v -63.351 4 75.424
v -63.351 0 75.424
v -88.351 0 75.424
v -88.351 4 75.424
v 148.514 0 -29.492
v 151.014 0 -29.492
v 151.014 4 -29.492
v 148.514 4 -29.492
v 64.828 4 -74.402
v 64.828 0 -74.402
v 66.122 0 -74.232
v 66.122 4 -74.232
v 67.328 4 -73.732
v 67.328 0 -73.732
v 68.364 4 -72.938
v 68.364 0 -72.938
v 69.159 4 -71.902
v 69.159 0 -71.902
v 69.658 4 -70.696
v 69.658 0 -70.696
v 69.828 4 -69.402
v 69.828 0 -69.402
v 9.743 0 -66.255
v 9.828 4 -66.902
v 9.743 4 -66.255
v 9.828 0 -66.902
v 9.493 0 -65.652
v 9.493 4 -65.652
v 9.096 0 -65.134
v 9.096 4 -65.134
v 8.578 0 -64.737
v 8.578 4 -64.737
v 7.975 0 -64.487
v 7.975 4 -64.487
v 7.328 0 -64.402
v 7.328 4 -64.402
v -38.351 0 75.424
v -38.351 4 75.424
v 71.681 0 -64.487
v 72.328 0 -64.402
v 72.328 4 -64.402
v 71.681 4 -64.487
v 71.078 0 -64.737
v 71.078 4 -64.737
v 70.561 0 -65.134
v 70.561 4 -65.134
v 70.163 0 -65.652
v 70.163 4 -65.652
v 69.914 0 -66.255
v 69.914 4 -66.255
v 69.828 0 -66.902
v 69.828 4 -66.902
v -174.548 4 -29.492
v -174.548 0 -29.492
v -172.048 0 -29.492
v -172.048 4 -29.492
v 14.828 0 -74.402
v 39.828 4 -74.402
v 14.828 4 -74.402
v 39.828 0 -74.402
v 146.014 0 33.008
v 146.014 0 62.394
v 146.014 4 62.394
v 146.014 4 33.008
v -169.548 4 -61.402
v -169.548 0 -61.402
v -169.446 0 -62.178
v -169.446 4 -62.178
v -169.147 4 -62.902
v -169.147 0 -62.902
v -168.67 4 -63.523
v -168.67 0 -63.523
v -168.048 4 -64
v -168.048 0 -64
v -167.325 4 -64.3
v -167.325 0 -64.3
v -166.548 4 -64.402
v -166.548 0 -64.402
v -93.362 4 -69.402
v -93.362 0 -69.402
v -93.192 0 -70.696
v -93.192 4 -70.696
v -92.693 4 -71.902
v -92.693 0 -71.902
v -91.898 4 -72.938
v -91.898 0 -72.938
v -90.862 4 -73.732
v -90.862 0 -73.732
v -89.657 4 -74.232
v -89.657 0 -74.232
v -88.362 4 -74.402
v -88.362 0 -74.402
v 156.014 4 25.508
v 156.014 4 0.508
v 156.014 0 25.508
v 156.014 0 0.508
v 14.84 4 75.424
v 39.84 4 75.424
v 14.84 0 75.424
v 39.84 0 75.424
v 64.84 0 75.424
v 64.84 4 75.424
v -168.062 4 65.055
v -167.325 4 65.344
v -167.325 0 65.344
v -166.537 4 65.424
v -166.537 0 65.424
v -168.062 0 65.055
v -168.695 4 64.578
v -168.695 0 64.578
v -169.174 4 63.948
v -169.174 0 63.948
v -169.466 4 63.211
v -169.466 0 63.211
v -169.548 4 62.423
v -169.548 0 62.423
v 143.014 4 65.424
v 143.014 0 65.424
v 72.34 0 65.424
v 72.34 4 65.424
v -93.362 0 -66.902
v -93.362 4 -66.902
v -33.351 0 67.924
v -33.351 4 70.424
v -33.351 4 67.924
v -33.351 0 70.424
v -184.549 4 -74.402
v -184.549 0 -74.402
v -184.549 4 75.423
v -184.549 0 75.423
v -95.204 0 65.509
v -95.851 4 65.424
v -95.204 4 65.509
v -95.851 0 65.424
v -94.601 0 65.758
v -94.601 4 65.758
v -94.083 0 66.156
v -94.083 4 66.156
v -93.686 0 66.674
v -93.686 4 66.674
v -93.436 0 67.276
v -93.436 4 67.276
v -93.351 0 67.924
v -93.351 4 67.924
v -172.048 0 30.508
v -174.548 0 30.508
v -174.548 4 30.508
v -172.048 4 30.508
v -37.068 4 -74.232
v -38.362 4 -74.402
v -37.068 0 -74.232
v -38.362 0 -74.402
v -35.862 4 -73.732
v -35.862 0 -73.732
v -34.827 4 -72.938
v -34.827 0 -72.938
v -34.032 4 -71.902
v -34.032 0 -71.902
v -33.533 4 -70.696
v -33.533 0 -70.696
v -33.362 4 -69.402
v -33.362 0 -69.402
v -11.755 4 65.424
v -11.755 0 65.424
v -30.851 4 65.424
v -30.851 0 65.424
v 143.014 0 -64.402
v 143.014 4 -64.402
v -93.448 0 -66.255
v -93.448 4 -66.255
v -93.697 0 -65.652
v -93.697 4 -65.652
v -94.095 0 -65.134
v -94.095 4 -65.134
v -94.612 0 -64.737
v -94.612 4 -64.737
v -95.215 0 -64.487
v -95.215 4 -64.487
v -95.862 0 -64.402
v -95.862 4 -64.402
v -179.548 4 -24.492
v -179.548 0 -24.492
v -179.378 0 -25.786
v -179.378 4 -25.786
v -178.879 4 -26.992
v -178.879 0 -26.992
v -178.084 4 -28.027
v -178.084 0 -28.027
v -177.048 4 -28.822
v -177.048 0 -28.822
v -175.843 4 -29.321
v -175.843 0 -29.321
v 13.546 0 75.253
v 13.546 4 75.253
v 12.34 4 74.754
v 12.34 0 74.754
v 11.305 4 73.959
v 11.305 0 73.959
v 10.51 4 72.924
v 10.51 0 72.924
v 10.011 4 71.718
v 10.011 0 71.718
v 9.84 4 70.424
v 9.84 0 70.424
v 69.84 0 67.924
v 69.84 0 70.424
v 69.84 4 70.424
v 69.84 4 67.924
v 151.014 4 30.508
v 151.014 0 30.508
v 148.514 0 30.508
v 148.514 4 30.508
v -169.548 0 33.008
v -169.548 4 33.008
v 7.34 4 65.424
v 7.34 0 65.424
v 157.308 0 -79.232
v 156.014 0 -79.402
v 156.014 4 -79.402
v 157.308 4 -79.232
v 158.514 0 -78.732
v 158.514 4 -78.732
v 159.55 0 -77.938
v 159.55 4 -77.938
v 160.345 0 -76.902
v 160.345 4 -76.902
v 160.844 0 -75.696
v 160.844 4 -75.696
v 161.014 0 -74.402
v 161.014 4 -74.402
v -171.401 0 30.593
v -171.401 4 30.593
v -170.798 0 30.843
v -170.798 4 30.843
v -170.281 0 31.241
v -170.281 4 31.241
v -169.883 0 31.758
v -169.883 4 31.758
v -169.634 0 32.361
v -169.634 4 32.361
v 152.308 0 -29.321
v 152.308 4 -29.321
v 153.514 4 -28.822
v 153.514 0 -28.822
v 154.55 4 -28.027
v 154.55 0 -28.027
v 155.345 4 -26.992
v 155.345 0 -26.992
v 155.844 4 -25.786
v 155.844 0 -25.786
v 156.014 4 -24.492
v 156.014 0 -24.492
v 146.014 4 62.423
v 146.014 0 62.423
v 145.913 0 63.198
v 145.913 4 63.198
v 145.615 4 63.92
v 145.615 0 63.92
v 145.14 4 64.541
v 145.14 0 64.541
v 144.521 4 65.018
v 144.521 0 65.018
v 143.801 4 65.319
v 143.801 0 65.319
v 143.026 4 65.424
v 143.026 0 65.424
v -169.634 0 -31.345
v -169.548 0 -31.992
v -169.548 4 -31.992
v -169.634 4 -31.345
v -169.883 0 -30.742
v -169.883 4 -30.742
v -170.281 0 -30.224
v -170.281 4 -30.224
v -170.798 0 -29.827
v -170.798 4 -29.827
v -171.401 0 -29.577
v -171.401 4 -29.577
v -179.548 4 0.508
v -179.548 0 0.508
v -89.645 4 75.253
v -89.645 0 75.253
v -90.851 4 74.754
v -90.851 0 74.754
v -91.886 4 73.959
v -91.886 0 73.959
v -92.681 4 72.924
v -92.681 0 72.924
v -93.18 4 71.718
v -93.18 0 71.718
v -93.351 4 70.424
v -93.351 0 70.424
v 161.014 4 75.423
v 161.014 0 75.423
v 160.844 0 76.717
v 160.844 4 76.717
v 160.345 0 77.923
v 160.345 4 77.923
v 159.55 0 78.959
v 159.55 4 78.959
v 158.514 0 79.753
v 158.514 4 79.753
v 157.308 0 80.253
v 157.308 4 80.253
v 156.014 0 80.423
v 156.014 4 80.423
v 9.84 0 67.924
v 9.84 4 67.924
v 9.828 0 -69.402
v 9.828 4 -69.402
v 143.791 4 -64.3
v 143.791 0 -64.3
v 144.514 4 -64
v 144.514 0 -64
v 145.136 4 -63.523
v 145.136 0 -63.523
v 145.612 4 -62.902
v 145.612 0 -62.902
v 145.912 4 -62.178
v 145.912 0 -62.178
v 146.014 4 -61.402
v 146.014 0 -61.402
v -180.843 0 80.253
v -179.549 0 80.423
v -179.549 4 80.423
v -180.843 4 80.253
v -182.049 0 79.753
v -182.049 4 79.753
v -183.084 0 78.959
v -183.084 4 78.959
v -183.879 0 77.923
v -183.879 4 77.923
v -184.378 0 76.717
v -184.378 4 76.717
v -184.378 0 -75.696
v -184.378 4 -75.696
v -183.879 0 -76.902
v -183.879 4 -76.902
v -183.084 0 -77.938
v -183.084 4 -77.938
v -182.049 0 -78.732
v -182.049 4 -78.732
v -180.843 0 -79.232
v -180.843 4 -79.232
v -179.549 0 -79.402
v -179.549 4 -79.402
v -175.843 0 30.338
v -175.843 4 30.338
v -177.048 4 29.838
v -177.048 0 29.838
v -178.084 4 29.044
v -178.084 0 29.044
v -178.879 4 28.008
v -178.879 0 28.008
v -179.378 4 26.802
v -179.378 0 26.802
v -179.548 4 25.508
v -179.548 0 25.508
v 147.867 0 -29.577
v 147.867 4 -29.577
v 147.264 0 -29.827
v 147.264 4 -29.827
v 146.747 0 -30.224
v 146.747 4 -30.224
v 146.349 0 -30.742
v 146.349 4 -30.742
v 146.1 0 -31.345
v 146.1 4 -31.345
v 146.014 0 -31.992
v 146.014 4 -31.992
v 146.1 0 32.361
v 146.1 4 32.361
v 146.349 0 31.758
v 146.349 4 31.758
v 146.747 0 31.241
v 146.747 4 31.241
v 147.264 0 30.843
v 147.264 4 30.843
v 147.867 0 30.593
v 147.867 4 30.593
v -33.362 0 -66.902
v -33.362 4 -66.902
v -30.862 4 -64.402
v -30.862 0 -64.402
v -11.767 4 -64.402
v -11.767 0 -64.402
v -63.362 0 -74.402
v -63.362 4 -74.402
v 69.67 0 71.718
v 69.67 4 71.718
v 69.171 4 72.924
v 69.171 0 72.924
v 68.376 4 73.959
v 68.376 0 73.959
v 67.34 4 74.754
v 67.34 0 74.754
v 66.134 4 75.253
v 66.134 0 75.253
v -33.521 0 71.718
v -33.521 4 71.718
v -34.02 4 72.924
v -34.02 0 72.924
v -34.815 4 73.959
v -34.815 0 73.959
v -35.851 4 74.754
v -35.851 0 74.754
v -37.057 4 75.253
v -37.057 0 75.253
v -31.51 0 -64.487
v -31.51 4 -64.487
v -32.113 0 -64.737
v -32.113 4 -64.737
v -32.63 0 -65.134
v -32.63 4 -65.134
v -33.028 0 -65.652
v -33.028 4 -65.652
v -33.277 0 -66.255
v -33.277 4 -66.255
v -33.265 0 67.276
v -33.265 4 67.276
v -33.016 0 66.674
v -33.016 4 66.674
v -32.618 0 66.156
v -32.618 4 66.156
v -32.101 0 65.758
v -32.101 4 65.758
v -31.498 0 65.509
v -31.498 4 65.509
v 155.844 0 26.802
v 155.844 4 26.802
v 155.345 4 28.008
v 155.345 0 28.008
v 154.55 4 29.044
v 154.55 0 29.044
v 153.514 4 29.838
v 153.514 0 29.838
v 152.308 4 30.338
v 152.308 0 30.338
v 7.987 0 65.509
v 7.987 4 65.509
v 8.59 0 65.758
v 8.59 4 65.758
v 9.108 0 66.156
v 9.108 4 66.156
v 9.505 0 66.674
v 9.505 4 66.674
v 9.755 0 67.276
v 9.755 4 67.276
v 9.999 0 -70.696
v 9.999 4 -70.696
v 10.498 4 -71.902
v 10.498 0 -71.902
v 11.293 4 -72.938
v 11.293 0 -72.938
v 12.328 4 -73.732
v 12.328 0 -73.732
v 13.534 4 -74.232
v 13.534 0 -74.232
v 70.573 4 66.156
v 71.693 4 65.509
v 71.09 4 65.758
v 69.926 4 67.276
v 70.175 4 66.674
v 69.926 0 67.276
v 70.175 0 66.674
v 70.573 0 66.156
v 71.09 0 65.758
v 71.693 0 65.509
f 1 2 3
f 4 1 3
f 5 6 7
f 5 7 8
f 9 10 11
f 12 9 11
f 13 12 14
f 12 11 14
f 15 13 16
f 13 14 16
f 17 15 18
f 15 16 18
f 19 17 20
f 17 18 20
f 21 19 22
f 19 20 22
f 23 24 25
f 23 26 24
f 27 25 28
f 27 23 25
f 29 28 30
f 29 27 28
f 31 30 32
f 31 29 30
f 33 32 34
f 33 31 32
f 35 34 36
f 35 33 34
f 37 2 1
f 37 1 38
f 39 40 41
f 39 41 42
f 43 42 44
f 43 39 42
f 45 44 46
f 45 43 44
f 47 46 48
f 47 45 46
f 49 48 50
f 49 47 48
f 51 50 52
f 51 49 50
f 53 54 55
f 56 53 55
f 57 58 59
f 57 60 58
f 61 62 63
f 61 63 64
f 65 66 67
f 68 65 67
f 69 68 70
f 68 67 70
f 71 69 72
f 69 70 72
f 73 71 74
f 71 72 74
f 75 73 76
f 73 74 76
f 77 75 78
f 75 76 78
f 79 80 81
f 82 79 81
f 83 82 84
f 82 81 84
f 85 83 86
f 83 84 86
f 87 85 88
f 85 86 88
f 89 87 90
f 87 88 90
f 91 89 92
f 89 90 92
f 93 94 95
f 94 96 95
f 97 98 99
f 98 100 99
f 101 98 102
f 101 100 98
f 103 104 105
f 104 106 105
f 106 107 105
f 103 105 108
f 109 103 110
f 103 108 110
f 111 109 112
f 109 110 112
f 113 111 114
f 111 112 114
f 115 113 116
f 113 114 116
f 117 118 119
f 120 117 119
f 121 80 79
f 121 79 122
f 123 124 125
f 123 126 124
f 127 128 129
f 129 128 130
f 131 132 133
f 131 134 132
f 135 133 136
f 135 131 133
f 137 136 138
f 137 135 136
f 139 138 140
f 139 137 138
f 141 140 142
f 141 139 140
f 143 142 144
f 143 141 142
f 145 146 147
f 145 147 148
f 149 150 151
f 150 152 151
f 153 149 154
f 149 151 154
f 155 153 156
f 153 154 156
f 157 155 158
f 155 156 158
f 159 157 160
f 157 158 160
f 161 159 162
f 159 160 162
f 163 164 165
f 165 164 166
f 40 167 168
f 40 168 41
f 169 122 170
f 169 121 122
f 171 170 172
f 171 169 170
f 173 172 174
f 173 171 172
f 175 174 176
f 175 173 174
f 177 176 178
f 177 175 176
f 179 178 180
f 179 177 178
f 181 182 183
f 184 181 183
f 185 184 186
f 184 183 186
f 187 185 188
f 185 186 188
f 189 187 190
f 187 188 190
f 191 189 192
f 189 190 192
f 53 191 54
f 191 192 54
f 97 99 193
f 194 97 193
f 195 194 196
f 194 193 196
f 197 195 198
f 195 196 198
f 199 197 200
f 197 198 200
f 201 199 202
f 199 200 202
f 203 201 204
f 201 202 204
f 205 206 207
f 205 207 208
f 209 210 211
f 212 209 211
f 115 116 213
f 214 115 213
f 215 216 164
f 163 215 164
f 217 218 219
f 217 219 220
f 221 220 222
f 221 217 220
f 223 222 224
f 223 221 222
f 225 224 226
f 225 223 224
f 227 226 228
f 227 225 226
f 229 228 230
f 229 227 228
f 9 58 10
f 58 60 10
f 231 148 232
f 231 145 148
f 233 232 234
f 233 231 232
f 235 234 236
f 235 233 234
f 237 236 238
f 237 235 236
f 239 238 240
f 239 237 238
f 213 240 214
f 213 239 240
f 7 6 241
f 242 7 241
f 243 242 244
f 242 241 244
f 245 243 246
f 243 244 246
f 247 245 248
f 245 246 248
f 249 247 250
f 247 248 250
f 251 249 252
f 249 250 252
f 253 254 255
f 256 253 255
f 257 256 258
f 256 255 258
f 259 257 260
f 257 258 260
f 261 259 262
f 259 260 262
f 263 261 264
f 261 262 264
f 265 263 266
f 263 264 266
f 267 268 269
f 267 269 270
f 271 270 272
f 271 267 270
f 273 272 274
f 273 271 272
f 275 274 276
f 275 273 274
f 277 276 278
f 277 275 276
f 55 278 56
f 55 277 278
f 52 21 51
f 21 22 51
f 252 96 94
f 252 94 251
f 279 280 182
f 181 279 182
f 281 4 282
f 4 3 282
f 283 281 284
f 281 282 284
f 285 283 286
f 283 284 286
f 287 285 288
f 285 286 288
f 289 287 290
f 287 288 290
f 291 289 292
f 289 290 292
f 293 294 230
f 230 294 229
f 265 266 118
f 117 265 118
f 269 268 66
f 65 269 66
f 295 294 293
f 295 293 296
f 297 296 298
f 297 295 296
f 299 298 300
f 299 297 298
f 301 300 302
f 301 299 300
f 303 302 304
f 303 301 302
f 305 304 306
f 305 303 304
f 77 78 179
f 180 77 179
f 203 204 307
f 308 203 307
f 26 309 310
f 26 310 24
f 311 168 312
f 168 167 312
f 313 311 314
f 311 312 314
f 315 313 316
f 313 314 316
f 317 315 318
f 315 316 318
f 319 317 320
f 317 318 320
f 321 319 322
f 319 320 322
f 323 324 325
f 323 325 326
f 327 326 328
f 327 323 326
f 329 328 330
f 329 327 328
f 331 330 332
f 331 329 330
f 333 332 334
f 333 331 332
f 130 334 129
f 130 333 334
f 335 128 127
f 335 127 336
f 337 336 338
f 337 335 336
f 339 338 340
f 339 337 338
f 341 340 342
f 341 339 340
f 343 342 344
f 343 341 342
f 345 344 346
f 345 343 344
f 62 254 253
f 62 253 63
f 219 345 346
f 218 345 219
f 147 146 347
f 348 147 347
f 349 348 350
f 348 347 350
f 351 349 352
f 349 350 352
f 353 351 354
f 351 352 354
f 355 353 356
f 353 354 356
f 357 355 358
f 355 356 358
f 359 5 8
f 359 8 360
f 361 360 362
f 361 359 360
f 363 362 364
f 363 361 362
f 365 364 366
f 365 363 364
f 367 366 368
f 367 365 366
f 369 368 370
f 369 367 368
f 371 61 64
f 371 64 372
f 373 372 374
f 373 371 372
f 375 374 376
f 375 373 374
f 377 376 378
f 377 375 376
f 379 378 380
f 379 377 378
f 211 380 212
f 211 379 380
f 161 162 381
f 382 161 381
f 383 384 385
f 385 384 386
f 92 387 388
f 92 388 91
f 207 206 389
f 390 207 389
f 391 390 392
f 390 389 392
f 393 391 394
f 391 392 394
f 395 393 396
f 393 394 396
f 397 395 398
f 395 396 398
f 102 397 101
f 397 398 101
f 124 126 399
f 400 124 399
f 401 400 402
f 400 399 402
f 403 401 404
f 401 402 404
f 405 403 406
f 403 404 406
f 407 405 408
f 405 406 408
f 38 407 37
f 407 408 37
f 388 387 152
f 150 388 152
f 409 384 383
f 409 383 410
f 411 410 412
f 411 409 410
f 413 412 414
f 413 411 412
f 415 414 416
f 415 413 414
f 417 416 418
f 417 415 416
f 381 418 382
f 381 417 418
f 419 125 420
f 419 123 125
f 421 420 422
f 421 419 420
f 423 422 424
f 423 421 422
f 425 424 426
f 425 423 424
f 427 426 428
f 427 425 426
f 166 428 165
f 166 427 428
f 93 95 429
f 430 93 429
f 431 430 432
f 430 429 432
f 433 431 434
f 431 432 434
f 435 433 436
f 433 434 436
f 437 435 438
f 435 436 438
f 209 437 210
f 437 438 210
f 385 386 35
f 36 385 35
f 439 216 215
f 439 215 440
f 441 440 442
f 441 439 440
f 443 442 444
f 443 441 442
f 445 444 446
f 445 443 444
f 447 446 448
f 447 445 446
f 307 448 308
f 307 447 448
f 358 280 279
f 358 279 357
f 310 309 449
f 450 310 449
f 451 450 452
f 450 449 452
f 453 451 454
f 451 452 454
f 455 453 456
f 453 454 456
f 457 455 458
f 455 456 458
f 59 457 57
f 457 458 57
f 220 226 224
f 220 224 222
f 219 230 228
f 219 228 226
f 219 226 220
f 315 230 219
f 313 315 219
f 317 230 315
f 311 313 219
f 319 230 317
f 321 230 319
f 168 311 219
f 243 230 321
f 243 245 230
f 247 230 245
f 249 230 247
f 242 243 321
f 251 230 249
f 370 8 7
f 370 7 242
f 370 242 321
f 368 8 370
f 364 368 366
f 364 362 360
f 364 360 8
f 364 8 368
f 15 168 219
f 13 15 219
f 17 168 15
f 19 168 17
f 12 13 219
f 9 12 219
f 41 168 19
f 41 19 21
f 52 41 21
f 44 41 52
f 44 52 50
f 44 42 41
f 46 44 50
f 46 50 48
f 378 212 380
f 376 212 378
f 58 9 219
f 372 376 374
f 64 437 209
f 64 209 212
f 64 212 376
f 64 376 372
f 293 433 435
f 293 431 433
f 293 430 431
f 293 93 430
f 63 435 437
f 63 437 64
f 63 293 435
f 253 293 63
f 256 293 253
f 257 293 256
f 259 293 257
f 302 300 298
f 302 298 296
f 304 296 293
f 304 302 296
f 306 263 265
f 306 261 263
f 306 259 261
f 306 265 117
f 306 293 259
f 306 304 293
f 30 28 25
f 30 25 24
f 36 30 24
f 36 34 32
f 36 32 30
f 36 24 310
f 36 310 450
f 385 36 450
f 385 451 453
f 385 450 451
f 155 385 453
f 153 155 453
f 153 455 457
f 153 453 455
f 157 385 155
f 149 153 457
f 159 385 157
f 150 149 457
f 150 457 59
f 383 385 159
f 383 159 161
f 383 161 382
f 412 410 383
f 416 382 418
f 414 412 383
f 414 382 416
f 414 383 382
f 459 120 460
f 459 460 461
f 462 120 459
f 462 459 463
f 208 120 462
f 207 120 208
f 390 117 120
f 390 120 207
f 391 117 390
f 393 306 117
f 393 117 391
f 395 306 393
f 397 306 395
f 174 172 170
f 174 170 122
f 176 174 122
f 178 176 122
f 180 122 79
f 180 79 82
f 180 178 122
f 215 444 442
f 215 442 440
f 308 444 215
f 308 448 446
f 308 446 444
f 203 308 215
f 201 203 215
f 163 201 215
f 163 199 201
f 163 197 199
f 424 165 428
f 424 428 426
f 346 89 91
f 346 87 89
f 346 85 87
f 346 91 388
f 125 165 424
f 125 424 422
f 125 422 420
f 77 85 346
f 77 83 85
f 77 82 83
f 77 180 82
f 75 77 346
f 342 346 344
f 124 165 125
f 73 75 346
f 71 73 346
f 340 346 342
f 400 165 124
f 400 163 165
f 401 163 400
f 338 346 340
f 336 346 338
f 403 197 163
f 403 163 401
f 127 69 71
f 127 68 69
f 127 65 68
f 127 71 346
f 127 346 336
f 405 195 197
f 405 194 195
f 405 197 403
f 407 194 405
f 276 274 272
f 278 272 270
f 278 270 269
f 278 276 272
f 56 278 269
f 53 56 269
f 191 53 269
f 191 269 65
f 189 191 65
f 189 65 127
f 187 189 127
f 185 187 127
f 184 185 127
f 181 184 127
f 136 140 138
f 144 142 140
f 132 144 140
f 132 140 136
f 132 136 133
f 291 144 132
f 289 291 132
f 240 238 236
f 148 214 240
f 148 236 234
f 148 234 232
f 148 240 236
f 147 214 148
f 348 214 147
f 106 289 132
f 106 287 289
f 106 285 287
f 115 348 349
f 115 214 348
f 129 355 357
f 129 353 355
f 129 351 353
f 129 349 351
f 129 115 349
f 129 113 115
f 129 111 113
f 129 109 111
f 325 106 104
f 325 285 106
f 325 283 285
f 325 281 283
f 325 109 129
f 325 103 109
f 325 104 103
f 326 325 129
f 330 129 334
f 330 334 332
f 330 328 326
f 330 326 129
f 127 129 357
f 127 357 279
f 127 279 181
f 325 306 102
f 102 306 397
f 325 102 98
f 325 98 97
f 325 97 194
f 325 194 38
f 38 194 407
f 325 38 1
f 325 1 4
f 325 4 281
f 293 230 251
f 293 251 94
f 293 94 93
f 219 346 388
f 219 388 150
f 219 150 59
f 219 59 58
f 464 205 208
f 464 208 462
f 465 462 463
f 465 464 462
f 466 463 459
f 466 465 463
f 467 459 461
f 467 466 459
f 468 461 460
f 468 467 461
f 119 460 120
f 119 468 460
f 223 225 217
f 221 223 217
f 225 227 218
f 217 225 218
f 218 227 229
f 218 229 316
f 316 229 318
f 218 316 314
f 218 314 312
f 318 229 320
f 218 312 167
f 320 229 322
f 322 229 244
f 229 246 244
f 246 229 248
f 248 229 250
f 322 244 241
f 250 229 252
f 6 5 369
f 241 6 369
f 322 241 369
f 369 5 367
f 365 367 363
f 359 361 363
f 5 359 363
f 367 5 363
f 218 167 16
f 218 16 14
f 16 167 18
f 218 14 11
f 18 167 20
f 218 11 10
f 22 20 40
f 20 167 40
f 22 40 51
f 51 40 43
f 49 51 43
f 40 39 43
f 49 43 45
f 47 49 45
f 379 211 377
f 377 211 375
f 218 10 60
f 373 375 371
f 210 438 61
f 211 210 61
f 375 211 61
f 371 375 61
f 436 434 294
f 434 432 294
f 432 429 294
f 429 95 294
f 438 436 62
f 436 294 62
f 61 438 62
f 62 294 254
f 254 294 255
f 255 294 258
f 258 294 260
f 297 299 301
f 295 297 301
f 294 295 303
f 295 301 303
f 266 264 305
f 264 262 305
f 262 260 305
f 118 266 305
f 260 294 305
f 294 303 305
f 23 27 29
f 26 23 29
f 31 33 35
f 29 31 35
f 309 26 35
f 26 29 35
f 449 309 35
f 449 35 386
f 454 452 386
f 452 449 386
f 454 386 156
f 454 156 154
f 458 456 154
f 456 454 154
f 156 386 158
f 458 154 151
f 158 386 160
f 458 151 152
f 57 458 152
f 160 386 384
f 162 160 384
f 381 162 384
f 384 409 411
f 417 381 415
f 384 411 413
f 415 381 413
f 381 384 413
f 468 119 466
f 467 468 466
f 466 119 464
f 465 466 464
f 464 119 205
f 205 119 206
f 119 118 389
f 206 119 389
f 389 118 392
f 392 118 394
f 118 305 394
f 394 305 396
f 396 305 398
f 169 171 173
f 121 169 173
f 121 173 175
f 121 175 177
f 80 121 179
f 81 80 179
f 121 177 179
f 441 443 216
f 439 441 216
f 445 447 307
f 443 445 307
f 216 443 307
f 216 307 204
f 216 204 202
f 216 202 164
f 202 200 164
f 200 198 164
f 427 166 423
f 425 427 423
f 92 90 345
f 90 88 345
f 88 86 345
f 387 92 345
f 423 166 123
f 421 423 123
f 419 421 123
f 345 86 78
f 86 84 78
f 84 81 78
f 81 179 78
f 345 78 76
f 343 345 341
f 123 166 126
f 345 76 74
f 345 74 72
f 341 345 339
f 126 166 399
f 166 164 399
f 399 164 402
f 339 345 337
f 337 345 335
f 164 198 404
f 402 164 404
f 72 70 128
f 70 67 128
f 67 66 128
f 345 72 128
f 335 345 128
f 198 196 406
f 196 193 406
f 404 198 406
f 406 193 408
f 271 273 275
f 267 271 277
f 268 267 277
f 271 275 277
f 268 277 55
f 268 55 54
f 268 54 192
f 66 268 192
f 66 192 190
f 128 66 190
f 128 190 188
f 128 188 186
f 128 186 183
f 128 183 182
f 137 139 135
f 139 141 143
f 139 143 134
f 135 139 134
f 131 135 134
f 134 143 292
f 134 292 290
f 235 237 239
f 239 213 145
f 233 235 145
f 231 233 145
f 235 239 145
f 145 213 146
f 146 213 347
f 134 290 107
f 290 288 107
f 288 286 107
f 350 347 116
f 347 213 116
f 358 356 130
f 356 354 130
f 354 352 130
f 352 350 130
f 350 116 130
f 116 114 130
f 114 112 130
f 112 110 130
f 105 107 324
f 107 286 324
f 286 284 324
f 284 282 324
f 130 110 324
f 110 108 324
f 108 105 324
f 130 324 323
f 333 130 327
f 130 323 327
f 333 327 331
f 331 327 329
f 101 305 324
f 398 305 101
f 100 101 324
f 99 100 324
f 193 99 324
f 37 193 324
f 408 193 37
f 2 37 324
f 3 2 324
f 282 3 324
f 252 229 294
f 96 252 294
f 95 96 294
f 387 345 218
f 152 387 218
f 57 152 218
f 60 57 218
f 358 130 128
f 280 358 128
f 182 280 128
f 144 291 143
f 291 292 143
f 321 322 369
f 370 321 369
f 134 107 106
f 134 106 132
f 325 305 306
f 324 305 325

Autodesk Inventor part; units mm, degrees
ref_plane "YZ Plane" through (0, 0, 0) normal (1, 0, 0) x (0, 1, 0)
ref_plane "XZ Plane" through (0, 0, 0) normal (0, 1, 0) x (-1, 0, 0)
ref_plane "XY Plane" through (0, 0, 0) normal (0, 0, 1) x (1, 0, 0)
sketch "Sketch1" plane through (0, 0, 0) normal (0, 1, 0) x (-1, 0, 0)
  line L0 (-161.0144, 75.423) -> (-161.0144, -74.402)
  line L1 (-156.0144, 80.423) -> (179.5486, 80.423)
  arc A0 (-156.0144, 80.423) -> (-161.0144, 75.423) centre (-156.0144, 75.423) ccw
  arc A1 (-161.0144, -74.402) -> (-156.0144, -79.402) centre (-156.0144, -74.402) ccw
  line L2 (184.5486, -74.402) -> (184.5486, 75.423)
  line L3 (179.5486, -79.402) -> (-156.0144, -79.402)
  arc A2 (179.5486, -79.402) -> (184.5486, -74.402) centre (179.5486, -74.402) ccw
  arc A3 (184.5486, 75.423) -> (179.5486, 80.423) centre (179.5486, 75.423) ccw
  line L4 (-143.0264, 65.4235) -> (-72.3404, 65.4235)
  line L5 (169.5485, 62.4233) -> (169.5485, 33.0083)
  line L6 (-146.0144, -61.402) -> (-146.0144, -31.9917)
  line L7 (-146.0144, 62.4233) -> (-146.0144, 33.0083)
  line L8 (-156.0144, 0.5083) -> (-156.0144, -24.4917)
  line L9 (-156.0144, 0.5083) -> (-156.0144, 25.5083)
  line L10 (-151.0144, -29.4917) -> (-148.5144, -29.4917)
  line L11 (-151.0144, 30.5083) -> (-148.5144, 30.5083)
  line L12 (-7.3404, 65.4235) -> (30.8506, 65.4235)
  line L13 (166.5366, 65.4235) -> (95.8506, 65.4235)
  arc A4 (-151.0144, 30.5083) -> (-156.0144, 25.5083) centre (-151.0144, 25.5083) ccw
  arc A5 (-156.0144, -24.4917) -> (-151.0144, -29.4917) centre (-151.0144, -24.4917) ccw
  arc A6 (-146.0144, -31.9917) -> (-148.5144, -29.4917) centre (-148.5144, -31.9917) ccw
  arc A7 (-148.5144, 30.5083) -> (-146.0144, 33.0083) centre (-148.5144, 33.0083) ccw
  line L14 (179.5485, 0.5083) -> (179.5485, 25.5083)
  line L15 (179.5485, 0.5083) -> (179.5485, -24.4917)
  line L16 (174.5485, 30.5083) -> (172.0485, 30.5083)
  line L17 (174.5485, -29.4917) -> (172.0485, -29.4917)
  arc A8 (174.5485, -29.4917) -> (179.5485, -24.4917) centre (174.5485, -24.4917) ccw
  arc A9 (179.5485, 25.5083) -> (174.5485, 30.5083) centre (174.5485, 25.5083) ccw
  arc A10 (169.5485, 33.0083) -> (172.0485, 30.5083) centre (172.0485, 33.0083) ccw
  arc A11 (172.0485, -29.4917) -> (169.5485, -31.9917) centre (172.0485, -31.9917) ccw
  line L18 (169.5485, -31.9917) -> (169.5485, -61.402)
  line L19 (-39.8404, 75.4235) -> (-64.8404, 75.4235)
  line L20 (-39.8404, 75.4235) -> (-14.8404, 75.4235)
  line L21 (-69.8404, 70.4235) -> (-69.8404, 67.9235)
  line L22 (-9.8404, 70.4235) -> (-9.8404, 67.9235)
  arc A12 (-9.8404, 70.4235) -> (-14.8404, 75.4235) centre (-14.8404, 70.4235) ccw
  arc A13 (-64.8404, 75.4235) -> (-69.8404, 70.4235) centre (-64.8404, 70.4235) ccw
  arc A14 (-72.3404, 65.4235) -> (-69.8404, 67.9235) centre (-72.3404, 67.9235) ccw
  arc A15 (-9.8404, 67.9235) -> (-7.3404, 65.4235) centre (-7.3404, 67.9235) ccw
  line L23 (63.3506, 75.4235) -> (38.3506, 75.4235)
  line L24 (63.3506, 75.4235) -> (88.3506, 75.4235)
  line L25 (33.3506, 70.4235) -> (33.3506, 67.9235)
  line L26 (93.3506, 70.4235) -> (93.3506, 67.9235)
  arc A16 (93.3506, 70.4235) -> (88.3506, 75.4235) centre (88.3506, 70.4235) ccw
  arc A17 (38.3506, 75.4235) -> (33.3506, 70.4235) centre (38.3506, 70.4235) ccw
  arc A18 (30.8506, 65.4235) -> (33.3506, 67.9235) centre (30.8506, 67.9235) ccw
  arc A19 (93.3506, 67.9235) -> (95.8506, 65.4235) centre (95.8506, 67.9235) ccw
  line L27 (166.5485, -64.402) -> (95.8625, -64.402)
  line L28 (-143.0144, -64.402) -> (-72.3284, -64.402)
  line L29 (63.3625, -74.402) -> (88.3625, -74.402)
  line L30 (63.3625, -74.402) -> (38.3625, -74.402)
  line L31 (93.3625, -69.402) -> (93.3625, -66.902)
  line L32 (33.3625, -69.402) -> (33.3625, -66.902)
  arc A20 (33.3625, -69.402) -> (38.3625, -74.402) centre (38.3625, -69.402) ccw
  arc A21 (88.3625, -74.402) -> (93.3625, -69.402) centre (88.3625, -69.402) ccw
  arc A22 (95.8625, -64.402) -> (93.3625, -66.902) centre (95.8625, -66.902) ccw
  arc A23 (33.3625, -66.902) -> (30.8625, -64.402) centre (30.8625, -66.902) ccw
  line L33 (-39.8284, -74.402) -> (-14.8284, -74.402)
  line L34 (-39.8284, -74.402) -> (-64.8284, -74.402)
  line L35 (-9.8284, -69.402) -> (-9.8284, -66.902)
  line L36 (-69.8284, -69.402) -> (-69.8284, -66.902)
  arc A24 (-69.8284, -69.402) -> (-64.8284, -74.402) centre (-64.8284, -69.402) ccw
  arc A25 (-14.8284, -74.402) -> (-9.8284, -69.402) centre (-14.8284, -69.402) ccw
  arc A26 (-7.3284, -64.402) -> (-9.8284, -66.902) centre (-7.3284, -66.902) ccw
  arc A27 (-69.8284, -66.902) -> (-72.3284, -64.402) centre (-72.3284, -66.902) ccw
  line L37 (30.8625, -64.402) -> (-7.3284, -64.402)
  line L38 (-7.3284, -64.402) -> (11.7666, -64.402)
  line L39 (-7.3404, 65.4235) -> (11.7546, 65.4235)
  arc A28 (-143.0144, 65.4235) -> (-146.0144, 62.394) centre (-143.0144, 62.4233) ccw
  arc A29 (169.5485, 62.4233) -> (166.5366, 65.4235) centre (166.6427, 62.5181) ccw
  arc A30 (166.5485, -64.402) -> (169.5485, -61.402) centre (166.5485, -61.402) ccw
  arc A31 (-146.0144, -61.402) -> (-143.0144, -64.402) centre (-143.0144, -61.402) ccw
  point P0 (0, 0)
extrude "Extrusion1" add sketch "Sketch1" along normal blind 4
properties part number "layer3"
